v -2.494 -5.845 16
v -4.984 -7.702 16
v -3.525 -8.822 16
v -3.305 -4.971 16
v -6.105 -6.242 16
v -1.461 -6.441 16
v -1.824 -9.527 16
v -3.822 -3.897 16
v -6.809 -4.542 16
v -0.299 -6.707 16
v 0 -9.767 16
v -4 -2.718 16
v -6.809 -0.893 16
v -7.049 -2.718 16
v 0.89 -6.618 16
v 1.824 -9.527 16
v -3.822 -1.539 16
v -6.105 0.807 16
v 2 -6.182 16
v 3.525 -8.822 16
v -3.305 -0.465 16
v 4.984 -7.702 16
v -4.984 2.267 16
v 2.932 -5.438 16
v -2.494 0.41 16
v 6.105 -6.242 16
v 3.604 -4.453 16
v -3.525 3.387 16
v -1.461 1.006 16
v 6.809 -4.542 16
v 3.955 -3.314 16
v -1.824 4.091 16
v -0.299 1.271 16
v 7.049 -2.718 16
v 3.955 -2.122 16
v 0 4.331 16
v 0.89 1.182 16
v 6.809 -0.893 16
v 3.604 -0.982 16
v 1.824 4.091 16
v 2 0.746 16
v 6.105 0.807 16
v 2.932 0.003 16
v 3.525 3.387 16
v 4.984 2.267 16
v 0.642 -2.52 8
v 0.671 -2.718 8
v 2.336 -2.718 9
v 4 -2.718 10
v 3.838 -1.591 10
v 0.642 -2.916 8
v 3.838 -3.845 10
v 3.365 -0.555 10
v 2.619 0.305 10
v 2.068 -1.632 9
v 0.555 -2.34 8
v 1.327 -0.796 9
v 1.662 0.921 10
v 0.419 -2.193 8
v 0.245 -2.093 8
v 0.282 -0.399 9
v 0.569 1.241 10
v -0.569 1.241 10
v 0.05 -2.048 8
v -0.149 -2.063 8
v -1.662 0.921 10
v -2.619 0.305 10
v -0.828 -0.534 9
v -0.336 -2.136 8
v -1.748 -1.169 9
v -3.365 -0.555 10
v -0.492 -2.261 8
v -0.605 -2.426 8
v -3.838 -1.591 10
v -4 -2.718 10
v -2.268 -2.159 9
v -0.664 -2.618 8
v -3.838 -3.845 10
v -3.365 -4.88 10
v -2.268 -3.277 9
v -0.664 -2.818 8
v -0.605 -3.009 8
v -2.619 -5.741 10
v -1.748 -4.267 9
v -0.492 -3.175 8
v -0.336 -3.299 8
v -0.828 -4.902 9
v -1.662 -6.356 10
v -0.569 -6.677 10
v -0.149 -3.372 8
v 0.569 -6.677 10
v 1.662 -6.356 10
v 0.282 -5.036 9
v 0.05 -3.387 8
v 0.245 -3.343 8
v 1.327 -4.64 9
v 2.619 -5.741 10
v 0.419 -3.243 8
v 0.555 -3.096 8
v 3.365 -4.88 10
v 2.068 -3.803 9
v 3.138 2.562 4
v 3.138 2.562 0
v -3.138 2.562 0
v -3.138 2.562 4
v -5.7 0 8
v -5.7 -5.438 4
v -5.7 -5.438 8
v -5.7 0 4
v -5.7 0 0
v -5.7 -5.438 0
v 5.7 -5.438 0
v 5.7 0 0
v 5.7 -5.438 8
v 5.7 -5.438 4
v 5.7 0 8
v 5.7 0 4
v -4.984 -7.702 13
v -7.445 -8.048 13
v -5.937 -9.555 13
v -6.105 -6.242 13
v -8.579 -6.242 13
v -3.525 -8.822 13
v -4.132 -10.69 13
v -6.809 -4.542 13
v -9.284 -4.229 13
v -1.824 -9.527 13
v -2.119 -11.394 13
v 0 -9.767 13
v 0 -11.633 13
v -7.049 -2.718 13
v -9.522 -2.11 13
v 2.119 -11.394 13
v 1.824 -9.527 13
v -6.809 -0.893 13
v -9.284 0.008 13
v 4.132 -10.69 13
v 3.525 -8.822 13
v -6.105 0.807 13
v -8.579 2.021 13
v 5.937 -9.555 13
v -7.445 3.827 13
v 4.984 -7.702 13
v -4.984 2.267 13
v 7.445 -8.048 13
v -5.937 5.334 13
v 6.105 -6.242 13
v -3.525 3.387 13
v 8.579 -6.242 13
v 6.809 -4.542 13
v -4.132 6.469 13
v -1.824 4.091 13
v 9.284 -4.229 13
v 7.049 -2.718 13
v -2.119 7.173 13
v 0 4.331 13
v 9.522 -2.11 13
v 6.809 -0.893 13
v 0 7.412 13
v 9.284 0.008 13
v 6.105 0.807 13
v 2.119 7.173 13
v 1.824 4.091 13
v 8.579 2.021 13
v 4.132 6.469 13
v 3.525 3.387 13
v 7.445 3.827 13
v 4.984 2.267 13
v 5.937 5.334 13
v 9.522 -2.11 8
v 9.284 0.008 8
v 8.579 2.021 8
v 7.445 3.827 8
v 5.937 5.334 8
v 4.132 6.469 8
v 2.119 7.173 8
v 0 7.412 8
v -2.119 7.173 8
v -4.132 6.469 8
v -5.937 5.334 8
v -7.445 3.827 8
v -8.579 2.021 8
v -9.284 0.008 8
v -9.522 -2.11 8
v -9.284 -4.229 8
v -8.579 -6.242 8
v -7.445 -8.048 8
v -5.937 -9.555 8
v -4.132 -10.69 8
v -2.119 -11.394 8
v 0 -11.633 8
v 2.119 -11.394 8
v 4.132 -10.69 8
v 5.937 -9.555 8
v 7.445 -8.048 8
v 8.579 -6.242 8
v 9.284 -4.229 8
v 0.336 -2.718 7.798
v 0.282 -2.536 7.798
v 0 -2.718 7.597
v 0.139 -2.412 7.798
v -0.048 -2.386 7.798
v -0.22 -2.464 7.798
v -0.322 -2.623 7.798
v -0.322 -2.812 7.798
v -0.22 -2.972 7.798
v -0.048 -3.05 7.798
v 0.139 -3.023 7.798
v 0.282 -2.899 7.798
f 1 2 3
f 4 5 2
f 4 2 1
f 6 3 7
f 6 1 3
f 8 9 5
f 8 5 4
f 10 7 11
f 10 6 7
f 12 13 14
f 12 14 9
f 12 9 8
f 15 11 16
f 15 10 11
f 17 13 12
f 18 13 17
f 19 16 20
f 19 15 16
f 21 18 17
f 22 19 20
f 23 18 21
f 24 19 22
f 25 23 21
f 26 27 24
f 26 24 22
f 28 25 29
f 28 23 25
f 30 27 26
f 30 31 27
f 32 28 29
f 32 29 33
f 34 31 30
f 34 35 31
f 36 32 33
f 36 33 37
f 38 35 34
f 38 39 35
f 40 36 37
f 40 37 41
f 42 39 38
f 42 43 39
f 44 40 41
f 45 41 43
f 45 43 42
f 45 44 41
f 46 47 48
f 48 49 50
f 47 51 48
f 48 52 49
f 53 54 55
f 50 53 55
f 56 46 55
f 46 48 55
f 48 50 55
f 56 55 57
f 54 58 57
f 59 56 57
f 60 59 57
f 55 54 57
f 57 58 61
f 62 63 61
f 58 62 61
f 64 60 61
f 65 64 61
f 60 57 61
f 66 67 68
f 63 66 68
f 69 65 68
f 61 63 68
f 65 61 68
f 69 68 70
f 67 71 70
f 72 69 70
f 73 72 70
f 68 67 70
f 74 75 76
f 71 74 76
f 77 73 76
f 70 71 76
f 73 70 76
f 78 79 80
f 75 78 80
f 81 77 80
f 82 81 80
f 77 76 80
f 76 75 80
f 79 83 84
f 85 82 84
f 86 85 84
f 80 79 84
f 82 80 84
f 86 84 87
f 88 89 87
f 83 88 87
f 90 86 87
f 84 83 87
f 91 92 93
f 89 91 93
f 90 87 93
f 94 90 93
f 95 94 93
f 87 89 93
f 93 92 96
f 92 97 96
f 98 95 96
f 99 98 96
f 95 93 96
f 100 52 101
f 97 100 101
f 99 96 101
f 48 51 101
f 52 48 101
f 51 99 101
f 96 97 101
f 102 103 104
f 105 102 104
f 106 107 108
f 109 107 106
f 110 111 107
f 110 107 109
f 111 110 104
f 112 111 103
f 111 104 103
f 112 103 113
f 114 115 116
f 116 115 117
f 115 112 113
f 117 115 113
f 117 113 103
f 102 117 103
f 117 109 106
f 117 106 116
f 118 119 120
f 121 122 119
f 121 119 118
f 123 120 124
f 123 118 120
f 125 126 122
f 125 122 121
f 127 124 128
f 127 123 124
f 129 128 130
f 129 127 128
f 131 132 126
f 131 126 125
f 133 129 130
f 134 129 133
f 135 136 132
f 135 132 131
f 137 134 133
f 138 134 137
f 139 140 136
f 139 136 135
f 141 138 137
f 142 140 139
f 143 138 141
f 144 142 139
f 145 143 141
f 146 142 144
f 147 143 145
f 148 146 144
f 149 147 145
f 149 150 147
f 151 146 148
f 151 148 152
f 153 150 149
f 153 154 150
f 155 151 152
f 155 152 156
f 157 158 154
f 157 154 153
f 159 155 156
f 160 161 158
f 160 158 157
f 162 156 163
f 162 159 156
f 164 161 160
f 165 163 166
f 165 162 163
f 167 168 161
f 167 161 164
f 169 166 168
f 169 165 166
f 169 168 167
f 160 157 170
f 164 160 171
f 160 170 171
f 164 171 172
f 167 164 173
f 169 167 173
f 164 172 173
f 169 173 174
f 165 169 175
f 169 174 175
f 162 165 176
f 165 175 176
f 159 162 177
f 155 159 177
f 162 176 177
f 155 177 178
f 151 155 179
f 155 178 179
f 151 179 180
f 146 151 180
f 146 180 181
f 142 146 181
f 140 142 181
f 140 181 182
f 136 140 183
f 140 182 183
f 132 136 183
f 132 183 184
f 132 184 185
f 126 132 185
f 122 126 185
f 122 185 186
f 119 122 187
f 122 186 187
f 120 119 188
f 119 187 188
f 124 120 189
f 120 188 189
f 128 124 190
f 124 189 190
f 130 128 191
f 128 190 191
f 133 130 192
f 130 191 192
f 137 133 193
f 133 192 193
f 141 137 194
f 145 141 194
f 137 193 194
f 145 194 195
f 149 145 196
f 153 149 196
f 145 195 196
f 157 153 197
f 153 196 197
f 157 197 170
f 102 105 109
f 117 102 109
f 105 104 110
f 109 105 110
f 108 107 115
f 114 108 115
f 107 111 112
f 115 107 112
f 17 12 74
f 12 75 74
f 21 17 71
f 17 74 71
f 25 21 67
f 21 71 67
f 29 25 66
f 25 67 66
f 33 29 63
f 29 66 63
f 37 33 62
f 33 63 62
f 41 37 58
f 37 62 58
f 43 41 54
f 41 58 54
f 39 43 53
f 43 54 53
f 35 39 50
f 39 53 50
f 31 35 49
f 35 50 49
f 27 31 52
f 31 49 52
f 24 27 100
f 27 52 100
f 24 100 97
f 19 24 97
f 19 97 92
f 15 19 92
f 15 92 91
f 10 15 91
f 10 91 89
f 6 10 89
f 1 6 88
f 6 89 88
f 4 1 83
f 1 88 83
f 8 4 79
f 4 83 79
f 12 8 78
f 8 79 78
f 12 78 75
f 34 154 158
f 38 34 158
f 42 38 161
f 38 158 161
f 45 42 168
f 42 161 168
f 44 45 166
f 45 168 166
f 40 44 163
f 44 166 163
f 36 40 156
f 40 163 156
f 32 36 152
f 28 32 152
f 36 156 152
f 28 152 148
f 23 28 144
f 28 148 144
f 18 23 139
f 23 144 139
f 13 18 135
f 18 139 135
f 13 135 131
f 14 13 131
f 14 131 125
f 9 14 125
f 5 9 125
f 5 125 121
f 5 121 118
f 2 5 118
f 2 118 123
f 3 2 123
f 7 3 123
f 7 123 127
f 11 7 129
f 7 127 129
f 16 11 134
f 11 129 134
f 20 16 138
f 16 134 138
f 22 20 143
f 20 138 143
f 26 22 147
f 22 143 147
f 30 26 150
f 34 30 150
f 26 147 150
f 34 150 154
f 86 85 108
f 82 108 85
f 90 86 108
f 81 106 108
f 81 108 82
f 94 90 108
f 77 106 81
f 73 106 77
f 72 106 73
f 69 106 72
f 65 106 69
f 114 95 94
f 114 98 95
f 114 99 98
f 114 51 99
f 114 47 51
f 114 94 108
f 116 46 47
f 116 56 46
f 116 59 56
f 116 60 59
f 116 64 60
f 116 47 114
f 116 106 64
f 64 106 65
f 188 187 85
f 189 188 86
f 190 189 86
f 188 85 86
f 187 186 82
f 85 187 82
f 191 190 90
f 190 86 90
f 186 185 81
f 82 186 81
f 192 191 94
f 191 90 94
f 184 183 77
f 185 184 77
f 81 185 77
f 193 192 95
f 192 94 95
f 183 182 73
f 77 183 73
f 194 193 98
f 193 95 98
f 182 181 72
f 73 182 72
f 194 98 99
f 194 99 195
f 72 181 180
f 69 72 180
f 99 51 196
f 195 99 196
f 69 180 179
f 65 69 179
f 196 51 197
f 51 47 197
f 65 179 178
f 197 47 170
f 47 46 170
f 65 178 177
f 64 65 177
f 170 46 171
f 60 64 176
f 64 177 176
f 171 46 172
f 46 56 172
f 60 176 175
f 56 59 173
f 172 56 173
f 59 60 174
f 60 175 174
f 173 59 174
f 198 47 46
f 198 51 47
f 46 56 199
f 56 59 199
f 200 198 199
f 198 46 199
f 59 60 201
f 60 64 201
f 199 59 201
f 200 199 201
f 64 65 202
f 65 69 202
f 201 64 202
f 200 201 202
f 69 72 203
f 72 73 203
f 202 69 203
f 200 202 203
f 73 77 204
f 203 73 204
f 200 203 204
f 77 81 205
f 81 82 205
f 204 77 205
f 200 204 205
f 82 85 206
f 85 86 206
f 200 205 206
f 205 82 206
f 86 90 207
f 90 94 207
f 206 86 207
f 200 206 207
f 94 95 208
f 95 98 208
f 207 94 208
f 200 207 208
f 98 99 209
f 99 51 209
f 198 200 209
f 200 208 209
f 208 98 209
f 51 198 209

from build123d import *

# Parameters (mm, degrees)
F0_DEPTH   = 4
F1_W       = 11.4
F1_H       = 5.4380514655
F2_DEPTH   = 4
F5_R       = 9.5224089712
F5_W       = 11.4
F5_H       = 5.4380514655
F6_DEPTH   = 5
F7_R       = 7.0490368144
F3_DEPTH   = 3
F9_D       = 8
F9_DEPTH   = 6
F9_TIP     = 2.4034424761
F9_2_D     = 8
F9_2_DEPTH = 6
F9_2_TIP   = 2.4034424761


with BuildPart() as f0:
    # F4 (on Top) → F0 (new body)
    with BuildSketch(Plane.XY):
        Polygon((-5.7, 0), (-5.7, -5.4380514655), (5.7, -5.4380514655), (5.7, 0), (3.1380514655, 2.5619485345), (-3.1380514655, 2.5619485345), align=None)
    extrude(amount=F0_DEPTH)

    # F1 (on face) → F2 (join)
    with BuildSketch(Plane.XY.offset(4)):
        with Locations((0, -2.7190257328)):
            Rectangle(F1_W, F1_H)
    extrude(amount=F2_DEPTH)

    # F9
    with Locations(Plane.XY.offset(16)):
        with Locations((0, -2.7178041637)):
            Hole(F9_D / 2, depth=F9_DEPTH)
            with Locations((0, 0, -(F9_DEPTH + F9_TIP / 2))):  # 118° drill point
                Cone(0, F9_D / 2, F9_TIP, mode=Mode.SUBTRACT)


with BuildPart() as f6:
    # F5 (on face) → F6 (new body)
    with BuildSketch(Plane.XY.offset(8)):
        with Locations((0, -2.1104682237)):
            Circle(F5_R)
        with Locations((0, -2.7190257328)):
            Rectangle(F5_W, F5_H, mode=Mode.SUBTRACT)
        with Locations((0, -2.7190257328)):
            Rectangle(F5_W, F5_H)
    extrude(amount=F6_DEPTH)

    # F7 (on face) → F3 (join)
    with BuildSketch(Plane.XY.offset(13)):
        with Locations((0, -2.7178041637)):
            Circle(F7_R)
    extrude(amount=F3_DEPTH)

    # F9#2
    with Locations(Plane.XY.offset(16)):
        with Locations((0, -2.7178041637)):
            Hole(F9_2_D / 2, depth=F9_2_DEPTH)
            with Locations((0, 0, -(F9_2_DEPTH + F9_2_TIP / 2))):  # 118° drill point
                Cone(0, F9_2_D / 2, F9_2_TIP, mode=Mode.SUBTRACT)


solid = Compound([f0.part, f6.part])
